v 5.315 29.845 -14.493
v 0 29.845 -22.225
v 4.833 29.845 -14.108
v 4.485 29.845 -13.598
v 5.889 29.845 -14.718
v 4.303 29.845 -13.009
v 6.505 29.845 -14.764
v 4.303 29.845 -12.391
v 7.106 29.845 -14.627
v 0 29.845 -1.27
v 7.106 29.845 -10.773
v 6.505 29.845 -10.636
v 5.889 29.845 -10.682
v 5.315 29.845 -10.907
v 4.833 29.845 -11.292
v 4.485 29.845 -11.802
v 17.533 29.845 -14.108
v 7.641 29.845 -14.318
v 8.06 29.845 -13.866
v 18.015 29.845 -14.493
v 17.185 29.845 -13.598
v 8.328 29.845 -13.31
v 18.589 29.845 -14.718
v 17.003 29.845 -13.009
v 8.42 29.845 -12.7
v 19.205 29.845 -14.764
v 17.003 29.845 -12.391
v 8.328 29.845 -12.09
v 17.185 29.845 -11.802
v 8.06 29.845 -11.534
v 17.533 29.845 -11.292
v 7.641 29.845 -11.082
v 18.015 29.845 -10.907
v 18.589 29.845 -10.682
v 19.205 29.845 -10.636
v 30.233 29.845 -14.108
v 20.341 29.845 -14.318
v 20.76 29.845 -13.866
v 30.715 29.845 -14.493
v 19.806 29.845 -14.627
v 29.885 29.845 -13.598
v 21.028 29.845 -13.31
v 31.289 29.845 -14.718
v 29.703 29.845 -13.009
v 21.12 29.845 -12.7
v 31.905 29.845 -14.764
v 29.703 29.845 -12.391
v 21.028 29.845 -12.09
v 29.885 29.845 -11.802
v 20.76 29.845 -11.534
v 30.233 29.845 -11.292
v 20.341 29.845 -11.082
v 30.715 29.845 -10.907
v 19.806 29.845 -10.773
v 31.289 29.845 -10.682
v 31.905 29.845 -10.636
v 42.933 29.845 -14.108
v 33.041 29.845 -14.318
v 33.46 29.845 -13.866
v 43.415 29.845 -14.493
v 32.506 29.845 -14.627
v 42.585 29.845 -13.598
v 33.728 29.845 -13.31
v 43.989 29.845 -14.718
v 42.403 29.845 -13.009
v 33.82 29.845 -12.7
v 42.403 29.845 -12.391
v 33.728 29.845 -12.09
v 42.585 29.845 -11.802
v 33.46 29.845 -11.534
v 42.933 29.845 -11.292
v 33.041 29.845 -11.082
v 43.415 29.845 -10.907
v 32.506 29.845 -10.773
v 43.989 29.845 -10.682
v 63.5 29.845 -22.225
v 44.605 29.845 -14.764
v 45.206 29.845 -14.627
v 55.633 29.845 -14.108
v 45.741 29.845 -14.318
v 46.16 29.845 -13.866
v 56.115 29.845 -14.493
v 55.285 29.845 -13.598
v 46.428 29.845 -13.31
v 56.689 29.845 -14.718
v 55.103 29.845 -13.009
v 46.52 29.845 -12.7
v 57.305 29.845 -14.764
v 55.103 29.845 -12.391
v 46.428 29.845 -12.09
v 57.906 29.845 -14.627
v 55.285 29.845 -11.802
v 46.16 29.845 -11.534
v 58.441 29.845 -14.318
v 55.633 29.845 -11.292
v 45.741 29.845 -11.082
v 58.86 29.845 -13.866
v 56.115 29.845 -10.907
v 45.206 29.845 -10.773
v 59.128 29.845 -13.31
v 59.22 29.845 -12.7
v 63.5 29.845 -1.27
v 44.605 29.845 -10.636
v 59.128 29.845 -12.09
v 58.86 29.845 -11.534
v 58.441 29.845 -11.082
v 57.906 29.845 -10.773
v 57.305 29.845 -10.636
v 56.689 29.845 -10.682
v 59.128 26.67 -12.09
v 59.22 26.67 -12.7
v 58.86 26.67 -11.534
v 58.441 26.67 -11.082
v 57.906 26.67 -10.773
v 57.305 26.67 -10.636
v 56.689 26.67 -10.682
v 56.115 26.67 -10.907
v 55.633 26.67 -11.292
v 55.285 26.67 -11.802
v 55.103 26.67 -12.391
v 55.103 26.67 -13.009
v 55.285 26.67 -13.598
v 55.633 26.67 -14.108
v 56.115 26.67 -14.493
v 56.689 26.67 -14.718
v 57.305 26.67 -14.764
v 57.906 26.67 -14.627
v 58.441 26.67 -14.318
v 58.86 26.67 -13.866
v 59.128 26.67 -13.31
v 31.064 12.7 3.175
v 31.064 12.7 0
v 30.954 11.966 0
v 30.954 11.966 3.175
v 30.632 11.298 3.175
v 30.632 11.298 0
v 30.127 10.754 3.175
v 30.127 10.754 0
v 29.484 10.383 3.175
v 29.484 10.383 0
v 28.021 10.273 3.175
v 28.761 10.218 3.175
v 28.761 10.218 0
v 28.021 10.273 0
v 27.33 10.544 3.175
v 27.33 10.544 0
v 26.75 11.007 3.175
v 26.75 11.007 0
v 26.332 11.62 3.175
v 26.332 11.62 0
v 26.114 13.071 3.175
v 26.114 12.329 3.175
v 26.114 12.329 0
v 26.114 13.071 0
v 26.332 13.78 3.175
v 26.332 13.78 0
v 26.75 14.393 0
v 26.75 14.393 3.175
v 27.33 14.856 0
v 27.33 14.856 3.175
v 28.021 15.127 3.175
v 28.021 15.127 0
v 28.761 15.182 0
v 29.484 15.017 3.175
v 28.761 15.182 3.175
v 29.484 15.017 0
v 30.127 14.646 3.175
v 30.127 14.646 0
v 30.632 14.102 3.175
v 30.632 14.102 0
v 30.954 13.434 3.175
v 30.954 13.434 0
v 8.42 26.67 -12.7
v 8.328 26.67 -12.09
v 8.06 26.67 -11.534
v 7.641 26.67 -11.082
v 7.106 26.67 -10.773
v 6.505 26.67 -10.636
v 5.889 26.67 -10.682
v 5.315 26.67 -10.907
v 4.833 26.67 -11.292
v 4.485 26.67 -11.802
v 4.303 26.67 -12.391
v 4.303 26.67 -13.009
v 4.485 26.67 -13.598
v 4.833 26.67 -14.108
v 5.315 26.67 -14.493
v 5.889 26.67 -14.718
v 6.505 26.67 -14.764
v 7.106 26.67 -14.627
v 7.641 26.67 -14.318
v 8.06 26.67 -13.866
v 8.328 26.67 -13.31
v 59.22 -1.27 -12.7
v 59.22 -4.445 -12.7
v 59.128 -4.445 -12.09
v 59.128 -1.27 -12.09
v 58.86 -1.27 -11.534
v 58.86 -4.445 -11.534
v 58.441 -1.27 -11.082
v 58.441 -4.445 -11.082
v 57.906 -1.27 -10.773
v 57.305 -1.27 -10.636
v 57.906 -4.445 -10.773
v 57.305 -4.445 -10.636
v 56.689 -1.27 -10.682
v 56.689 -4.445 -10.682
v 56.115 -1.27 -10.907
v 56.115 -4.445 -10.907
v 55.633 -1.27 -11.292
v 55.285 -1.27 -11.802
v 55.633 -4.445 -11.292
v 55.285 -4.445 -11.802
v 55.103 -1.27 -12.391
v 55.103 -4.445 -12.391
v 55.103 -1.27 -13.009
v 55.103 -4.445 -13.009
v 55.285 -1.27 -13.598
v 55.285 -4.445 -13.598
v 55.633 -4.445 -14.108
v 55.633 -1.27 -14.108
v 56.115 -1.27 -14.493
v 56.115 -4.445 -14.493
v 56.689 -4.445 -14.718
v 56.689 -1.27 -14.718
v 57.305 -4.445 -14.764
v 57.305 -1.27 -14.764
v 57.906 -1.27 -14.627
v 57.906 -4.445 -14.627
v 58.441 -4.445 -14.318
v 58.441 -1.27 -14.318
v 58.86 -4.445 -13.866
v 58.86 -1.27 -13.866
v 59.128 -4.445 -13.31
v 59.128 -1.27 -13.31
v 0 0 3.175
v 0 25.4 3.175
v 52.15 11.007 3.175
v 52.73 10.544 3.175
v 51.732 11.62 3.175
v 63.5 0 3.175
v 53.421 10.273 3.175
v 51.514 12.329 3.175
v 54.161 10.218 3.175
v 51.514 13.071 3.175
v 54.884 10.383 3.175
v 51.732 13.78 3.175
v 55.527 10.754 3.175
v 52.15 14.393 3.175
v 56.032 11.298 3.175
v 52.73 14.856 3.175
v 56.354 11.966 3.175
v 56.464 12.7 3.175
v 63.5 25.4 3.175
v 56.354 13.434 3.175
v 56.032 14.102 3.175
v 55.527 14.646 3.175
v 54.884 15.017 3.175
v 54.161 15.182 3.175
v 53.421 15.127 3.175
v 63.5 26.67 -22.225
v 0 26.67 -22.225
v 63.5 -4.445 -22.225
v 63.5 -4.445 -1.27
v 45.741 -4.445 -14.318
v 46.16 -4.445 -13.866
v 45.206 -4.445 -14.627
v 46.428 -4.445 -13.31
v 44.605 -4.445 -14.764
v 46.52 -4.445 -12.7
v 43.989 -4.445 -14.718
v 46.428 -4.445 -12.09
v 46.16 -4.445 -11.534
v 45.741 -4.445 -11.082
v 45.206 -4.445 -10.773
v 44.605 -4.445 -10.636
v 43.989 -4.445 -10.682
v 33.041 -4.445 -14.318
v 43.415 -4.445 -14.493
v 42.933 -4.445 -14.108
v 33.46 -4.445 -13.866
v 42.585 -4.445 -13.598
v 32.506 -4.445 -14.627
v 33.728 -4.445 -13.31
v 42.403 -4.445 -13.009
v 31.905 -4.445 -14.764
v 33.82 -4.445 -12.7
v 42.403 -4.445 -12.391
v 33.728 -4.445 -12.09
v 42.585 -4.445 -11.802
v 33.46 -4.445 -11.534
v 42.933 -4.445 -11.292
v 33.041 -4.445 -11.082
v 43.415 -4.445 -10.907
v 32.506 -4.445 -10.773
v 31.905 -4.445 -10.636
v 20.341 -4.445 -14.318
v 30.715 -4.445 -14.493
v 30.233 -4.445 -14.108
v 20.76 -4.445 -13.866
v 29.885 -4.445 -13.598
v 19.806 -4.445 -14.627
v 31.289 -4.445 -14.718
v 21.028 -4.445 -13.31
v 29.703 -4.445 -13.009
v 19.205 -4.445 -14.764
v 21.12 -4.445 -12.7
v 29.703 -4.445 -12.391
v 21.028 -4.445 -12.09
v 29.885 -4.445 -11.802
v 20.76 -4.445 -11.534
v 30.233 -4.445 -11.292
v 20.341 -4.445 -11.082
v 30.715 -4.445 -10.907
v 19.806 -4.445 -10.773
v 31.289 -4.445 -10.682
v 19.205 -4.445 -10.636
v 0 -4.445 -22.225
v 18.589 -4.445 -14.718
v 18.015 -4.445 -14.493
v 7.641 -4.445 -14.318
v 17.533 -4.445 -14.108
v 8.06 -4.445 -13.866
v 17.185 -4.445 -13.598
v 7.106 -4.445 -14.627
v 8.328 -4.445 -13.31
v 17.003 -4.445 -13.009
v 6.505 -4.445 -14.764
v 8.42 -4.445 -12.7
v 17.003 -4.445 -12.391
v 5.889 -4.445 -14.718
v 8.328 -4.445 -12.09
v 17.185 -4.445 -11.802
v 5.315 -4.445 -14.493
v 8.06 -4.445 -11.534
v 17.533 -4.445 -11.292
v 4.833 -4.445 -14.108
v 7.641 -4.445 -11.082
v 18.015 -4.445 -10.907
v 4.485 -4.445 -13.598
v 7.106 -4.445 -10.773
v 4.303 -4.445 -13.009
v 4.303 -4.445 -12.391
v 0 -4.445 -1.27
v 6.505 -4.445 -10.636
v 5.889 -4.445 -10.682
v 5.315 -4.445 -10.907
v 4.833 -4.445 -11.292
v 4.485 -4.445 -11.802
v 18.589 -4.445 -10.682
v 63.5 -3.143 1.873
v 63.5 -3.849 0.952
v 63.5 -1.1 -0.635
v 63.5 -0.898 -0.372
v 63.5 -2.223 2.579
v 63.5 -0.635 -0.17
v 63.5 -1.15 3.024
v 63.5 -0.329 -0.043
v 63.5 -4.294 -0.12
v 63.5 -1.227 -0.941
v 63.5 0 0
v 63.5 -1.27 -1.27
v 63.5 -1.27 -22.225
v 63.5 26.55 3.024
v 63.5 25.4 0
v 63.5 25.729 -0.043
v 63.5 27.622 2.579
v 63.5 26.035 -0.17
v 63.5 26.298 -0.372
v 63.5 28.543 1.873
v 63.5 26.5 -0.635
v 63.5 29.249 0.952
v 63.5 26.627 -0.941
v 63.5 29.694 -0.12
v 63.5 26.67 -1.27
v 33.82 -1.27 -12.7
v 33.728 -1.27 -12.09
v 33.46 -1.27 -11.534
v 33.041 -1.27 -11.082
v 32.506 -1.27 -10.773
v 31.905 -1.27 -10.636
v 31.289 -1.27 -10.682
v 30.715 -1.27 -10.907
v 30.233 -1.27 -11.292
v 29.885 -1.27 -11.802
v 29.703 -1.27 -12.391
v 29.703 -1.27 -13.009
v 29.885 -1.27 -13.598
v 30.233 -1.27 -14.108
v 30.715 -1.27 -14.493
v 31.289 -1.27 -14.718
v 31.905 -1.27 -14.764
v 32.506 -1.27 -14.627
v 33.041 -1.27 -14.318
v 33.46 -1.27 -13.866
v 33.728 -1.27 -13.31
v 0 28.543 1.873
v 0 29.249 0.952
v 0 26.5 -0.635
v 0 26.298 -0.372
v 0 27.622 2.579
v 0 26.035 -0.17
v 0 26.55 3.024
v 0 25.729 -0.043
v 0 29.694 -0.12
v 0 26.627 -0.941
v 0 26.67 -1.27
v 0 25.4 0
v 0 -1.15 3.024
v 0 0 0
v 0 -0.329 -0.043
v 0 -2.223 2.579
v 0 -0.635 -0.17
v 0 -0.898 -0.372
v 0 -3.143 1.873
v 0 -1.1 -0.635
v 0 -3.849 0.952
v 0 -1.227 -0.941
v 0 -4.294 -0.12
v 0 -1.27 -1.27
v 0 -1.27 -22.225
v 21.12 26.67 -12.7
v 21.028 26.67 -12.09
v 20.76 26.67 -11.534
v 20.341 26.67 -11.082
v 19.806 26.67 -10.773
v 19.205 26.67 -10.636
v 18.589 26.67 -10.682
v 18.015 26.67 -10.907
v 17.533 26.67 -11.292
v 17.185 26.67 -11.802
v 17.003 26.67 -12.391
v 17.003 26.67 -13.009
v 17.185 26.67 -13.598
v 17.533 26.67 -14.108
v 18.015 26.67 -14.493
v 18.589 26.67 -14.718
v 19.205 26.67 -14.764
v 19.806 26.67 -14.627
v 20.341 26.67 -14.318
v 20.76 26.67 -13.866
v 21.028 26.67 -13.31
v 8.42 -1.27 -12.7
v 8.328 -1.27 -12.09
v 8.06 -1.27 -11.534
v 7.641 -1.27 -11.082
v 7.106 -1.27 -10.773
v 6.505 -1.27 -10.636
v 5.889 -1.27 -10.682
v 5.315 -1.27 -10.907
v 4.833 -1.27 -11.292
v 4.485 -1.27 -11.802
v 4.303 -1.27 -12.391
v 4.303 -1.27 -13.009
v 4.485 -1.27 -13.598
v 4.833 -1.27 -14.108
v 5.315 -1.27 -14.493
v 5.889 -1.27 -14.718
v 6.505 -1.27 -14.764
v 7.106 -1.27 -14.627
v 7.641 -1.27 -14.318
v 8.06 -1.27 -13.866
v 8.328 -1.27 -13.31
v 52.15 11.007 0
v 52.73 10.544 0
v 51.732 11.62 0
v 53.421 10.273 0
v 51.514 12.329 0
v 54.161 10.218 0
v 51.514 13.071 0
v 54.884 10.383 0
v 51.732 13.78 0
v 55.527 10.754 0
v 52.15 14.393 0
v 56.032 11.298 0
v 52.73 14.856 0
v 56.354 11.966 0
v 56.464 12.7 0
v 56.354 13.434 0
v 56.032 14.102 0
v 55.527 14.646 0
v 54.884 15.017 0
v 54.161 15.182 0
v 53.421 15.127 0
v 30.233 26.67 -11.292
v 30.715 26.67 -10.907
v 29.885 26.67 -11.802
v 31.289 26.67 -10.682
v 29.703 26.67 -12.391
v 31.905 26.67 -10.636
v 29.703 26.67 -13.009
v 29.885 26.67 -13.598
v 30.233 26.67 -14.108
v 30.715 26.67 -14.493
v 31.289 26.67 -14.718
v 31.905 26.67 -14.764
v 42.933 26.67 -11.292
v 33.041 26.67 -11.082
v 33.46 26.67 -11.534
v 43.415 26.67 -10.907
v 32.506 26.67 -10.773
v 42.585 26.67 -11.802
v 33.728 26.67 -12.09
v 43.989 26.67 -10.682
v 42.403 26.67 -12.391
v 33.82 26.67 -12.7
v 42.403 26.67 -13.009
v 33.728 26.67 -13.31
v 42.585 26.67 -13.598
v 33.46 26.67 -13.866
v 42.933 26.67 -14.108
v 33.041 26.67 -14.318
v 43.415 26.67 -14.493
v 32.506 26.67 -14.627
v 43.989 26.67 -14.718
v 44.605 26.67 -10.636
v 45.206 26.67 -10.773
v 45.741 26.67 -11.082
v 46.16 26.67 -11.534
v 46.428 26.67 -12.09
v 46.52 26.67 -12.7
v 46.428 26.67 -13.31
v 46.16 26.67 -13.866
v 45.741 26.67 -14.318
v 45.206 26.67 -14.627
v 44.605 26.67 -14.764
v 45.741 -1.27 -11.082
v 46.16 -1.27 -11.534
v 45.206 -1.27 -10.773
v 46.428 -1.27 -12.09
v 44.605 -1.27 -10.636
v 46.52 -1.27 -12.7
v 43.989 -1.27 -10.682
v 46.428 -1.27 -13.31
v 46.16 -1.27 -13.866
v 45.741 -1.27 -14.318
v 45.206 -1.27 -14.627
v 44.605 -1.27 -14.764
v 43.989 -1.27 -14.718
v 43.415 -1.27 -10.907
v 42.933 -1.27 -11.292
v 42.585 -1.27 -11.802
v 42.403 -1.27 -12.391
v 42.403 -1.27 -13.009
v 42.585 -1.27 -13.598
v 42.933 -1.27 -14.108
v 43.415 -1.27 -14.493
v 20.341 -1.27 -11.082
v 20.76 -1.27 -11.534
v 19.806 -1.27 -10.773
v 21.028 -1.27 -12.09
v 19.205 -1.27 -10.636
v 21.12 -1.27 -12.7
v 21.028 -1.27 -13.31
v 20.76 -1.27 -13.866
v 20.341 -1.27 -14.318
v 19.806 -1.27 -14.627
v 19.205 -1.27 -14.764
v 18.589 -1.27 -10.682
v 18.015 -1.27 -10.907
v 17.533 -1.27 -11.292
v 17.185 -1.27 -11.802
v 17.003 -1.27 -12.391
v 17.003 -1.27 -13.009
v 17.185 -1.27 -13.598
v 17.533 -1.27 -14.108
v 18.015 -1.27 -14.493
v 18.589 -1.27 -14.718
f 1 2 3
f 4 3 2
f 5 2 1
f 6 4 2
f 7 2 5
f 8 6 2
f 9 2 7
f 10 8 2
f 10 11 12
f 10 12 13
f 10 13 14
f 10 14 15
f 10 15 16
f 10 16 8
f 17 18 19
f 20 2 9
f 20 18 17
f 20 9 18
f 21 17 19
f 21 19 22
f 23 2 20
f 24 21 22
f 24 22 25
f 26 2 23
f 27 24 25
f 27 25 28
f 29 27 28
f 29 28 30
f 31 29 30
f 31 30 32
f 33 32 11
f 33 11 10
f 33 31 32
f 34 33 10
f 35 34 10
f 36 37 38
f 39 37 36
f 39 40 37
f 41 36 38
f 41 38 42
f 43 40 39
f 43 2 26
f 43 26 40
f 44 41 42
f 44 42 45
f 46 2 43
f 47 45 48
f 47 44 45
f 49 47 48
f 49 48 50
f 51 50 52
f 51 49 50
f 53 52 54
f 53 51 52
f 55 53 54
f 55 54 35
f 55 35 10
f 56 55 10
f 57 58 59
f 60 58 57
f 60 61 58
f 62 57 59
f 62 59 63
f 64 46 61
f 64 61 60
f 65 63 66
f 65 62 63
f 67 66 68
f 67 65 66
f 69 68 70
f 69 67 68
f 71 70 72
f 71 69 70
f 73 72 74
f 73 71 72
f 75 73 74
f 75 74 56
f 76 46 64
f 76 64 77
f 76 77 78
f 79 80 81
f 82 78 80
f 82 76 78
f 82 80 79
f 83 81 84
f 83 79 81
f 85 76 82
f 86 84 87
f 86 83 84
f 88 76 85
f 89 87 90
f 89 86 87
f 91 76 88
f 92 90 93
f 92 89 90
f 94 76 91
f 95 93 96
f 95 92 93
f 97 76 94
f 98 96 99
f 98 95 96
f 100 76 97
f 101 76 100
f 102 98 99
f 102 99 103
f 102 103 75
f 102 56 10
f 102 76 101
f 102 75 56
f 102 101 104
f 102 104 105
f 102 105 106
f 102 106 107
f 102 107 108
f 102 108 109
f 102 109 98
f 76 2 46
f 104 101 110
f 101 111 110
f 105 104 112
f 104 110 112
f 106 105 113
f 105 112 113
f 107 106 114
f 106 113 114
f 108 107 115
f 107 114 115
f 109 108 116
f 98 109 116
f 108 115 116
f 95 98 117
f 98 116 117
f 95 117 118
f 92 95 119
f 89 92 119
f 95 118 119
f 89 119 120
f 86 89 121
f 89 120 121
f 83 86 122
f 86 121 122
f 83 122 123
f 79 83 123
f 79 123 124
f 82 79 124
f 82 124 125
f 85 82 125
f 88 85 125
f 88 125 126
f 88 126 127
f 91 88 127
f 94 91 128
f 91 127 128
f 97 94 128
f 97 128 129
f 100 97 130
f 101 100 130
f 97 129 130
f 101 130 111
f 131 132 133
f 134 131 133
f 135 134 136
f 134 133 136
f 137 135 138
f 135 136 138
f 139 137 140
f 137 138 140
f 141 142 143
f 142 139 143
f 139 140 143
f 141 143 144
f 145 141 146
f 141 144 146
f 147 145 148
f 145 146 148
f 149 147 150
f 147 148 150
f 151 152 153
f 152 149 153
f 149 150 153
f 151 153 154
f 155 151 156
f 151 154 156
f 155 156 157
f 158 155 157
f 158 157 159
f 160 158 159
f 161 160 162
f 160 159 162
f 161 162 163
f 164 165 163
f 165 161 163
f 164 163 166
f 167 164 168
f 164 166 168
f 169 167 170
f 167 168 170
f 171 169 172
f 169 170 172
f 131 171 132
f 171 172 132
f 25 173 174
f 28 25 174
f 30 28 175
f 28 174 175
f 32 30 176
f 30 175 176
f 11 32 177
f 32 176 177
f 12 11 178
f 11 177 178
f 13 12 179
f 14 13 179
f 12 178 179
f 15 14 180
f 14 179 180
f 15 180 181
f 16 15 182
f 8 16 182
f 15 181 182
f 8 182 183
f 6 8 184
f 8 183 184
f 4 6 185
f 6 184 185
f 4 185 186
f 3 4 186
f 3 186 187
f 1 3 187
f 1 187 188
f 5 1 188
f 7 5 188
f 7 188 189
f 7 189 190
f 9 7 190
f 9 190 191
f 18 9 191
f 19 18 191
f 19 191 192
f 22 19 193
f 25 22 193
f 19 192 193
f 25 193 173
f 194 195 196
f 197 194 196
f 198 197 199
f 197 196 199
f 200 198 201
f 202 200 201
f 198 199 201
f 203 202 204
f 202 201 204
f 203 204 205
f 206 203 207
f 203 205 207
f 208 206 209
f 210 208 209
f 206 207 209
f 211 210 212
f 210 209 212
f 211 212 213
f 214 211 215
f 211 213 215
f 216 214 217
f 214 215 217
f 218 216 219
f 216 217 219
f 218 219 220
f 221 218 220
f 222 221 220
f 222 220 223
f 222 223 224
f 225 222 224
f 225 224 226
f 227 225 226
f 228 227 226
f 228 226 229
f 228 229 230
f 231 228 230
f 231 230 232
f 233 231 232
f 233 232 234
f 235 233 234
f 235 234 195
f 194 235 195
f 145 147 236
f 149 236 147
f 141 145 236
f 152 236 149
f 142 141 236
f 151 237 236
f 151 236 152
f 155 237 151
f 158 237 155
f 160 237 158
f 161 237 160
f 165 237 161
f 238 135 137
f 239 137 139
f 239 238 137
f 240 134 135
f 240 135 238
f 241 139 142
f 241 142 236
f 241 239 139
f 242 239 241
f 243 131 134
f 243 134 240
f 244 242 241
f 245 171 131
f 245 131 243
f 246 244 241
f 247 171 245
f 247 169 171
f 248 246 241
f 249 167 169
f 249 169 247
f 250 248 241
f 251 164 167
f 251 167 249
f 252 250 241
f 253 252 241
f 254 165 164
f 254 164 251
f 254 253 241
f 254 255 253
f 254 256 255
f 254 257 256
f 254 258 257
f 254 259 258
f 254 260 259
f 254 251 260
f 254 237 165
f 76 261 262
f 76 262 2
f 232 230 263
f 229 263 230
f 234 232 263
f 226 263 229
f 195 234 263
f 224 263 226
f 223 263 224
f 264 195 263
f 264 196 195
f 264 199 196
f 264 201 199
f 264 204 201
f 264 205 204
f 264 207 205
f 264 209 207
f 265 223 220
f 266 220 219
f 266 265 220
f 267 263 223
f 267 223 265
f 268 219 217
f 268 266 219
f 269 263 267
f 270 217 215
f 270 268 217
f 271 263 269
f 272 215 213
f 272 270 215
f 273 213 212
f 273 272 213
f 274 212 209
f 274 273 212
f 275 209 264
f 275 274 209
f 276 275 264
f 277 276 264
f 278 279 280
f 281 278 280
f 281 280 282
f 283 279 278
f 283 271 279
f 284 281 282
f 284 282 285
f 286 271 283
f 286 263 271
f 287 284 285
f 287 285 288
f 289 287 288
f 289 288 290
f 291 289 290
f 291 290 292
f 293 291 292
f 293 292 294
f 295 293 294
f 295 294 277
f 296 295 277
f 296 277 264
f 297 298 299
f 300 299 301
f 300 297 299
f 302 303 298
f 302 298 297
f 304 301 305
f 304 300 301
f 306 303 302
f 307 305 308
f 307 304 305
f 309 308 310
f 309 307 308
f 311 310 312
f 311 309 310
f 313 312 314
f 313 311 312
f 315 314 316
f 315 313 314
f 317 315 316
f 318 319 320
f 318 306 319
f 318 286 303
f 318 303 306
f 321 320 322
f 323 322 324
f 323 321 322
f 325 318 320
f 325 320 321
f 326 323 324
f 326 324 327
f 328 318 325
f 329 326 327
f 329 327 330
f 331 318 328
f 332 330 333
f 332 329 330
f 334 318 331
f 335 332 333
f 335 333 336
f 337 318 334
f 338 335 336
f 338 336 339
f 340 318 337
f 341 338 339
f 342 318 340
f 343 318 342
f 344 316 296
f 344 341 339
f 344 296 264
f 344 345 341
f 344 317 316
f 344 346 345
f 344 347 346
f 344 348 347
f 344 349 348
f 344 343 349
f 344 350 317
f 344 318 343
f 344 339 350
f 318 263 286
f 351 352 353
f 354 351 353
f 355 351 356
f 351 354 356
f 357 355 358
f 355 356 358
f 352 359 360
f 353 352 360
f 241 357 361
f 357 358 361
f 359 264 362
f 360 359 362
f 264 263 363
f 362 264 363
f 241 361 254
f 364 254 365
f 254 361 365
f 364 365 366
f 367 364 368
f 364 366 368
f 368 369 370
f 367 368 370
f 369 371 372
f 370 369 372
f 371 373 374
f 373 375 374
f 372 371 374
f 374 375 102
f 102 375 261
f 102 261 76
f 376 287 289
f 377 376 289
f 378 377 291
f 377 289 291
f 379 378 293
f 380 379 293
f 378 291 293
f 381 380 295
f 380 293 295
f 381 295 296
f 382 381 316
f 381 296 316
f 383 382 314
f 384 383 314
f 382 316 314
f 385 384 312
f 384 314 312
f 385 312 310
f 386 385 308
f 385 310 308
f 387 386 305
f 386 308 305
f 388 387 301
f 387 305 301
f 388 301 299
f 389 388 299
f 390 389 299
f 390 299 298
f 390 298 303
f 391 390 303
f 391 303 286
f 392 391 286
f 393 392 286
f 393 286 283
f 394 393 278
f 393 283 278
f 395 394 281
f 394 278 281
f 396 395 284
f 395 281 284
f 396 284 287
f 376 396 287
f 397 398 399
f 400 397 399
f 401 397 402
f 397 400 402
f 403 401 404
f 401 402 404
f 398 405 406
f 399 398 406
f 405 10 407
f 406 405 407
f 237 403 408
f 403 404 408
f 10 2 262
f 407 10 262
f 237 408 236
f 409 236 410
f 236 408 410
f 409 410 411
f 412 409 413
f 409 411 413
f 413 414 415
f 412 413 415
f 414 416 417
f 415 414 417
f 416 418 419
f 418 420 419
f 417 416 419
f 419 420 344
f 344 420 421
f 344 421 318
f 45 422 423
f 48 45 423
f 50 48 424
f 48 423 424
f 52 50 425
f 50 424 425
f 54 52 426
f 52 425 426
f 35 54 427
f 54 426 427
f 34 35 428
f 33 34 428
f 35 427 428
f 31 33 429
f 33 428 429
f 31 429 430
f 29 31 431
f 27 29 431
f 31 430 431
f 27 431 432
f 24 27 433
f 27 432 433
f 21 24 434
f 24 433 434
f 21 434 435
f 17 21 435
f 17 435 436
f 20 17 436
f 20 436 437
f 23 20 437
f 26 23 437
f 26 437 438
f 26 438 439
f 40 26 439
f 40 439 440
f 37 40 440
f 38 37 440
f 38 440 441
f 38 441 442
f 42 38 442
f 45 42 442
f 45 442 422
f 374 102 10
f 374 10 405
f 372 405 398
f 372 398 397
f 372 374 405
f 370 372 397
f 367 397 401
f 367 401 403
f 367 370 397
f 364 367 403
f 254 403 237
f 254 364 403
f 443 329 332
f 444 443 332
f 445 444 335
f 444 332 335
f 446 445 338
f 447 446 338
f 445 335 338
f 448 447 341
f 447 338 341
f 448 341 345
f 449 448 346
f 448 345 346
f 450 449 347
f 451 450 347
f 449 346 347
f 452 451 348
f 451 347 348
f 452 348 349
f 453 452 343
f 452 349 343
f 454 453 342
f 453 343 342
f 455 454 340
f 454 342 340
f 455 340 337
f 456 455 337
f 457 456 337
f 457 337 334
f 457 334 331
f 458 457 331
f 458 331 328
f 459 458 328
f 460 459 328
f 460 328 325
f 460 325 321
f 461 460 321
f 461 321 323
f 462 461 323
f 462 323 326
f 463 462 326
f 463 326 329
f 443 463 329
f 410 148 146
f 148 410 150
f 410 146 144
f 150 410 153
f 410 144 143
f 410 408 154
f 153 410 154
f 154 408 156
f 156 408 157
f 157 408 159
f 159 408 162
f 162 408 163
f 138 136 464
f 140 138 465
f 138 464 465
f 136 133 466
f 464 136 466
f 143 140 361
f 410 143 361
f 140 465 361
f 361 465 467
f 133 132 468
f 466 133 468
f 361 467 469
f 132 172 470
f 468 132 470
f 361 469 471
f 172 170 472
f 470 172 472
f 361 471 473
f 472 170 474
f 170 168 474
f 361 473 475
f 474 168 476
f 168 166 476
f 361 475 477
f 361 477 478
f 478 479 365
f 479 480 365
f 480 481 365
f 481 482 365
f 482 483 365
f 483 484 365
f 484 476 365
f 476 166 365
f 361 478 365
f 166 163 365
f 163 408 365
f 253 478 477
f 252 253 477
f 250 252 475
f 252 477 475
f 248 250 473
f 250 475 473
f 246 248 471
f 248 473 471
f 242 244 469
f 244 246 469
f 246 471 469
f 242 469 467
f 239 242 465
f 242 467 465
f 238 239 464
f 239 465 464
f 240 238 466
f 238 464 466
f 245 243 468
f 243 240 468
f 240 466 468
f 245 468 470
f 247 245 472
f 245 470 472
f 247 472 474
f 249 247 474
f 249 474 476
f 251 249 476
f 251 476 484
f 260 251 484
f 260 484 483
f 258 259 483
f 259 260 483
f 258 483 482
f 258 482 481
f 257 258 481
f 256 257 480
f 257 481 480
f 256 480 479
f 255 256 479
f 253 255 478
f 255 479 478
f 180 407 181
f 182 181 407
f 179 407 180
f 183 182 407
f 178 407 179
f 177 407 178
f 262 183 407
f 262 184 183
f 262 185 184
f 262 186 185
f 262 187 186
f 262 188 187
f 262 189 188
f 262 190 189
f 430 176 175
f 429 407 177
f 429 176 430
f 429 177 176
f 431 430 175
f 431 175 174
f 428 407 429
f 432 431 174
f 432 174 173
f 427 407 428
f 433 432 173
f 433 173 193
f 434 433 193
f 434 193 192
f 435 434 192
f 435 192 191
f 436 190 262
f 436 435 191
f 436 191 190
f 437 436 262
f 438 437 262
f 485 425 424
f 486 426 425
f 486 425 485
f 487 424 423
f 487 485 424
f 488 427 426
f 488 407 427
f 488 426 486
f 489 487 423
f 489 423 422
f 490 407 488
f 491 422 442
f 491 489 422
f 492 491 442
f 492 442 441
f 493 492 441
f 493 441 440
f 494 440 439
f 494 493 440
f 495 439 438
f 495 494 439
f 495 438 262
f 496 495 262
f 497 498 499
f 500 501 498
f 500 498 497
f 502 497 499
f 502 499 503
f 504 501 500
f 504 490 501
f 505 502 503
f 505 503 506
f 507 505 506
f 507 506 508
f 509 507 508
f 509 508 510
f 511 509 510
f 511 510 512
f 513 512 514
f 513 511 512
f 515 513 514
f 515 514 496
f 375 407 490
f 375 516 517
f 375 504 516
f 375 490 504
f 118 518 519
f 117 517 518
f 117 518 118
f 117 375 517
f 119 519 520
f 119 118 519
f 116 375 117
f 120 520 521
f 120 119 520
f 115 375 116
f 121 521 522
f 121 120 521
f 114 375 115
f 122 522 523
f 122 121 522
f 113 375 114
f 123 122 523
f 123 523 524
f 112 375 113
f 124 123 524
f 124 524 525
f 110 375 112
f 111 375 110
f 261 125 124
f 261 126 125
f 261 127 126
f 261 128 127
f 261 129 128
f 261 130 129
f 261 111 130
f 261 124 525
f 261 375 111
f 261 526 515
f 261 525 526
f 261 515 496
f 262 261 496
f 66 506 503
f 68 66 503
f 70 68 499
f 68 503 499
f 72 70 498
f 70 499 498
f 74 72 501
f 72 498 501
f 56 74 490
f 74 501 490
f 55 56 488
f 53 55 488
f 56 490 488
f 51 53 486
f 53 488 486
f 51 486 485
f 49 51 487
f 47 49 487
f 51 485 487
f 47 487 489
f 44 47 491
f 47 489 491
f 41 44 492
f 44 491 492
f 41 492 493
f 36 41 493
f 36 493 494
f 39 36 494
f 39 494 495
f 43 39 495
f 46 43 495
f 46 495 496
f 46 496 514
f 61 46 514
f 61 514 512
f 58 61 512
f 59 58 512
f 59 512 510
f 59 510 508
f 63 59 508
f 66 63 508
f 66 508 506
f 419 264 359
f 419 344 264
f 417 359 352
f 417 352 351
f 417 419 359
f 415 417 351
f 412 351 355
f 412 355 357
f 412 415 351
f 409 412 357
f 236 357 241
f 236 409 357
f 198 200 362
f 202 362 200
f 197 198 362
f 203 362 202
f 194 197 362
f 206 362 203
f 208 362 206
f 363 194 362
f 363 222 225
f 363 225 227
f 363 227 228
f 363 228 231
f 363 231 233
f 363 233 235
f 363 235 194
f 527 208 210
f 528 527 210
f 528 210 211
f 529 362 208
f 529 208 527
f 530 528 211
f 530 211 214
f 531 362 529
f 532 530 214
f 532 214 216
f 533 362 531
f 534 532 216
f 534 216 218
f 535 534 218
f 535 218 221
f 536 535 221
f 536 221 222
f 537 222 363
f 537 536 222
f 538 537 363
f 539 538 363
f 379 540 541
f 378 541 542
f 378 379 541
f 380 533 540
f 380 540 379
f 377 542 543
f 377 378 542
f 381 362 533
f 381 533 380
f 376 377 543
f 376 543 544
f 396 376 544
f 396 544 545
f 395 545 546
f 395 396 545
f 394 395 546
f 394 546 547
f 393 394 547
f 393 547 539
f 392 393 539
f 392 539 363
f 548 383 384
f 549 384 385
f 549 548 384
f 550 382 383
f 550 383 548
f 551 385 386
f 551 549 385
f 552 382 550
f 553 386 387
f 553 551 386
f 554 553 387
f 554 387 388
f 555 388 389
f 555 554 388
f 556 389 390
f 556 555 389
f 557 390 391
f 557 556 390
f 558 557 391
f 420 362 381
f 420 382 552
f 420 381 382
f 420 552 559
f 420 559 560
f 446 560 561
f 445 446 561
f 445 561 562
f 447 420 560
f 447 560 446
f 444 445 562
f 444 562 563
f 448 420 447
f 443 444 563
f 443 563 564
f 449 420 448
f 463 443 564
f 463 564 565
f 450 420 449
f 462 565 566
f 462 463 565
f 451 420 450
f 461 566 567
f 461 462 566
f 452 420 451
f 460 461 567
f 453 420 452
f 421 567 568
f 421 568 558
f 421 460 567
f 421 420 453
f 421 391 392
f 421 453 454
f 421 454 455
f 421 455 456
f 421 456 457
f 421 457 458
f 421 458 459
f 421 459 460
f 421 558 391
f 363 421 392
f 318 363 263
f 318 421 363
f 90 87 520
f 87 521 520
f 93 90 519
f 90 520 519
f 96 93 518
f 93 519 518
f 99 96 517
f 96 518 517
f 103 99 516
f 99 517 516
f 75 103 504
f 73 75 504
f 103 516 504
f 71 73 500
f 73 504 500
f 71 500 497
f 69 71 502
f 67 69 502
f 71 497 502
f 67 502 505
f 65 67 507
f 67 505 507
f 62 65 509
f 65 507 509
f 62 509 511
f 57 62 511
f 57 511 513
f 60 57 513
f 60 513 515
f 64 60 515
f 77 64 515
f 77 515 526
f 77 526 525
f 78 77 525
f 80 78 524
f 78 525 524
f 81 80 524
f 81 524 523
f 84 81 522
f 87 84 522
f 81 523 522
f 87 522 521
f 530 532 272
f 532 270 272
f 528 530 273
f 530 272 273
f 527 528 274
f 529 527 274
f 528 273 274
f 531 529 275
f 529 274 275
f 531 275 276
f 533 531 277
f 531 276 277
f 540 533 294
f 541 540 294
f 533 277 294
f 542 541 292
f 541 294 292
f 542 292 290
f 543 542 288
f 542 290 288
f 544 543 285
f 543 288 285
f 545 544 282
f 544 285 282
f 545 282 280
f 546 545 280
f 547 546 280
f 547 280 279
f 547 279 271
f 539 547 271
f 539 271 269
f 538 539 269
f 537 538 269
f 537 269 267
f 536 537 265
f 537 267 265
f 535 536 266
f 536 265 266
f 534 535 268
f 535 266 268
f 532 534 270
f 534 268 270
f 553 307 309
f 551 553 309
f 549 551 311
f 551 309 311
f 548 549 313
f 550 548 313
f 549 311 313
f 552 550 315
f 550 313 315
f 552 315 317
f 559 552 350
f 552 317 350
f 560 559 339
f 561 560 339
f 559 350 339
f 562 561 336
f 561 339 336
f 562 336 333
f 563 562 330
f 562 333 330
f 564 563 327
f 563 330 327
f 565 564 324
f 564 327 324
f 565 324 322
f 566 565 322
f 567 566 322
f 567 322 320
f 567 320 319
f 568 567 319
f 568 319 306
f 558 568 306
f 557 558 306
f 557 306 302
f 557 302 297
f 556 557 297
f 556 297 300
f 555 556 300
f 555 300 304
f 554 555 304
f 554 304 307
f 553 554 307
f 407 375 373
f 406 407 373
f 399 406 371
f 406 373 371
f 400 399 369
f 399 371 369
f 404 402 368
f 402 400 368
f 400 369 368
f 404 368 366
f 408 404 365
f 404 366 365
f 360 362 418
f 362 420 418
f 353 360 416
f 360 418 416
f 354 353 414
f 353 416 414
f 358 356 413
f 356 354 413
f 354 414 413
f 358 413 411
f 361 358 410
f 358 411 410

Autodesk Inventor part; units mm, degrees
ref_plane "YZ Plane" through (0, 0, 0) normal (1, 0, 0) x (0, 1, 0)
ref_plane "XZ Plane" through (0, 0, 0) normal (0, 1, 0) x (-1, 0, 0)
ref_plane "XY Plane" through (0, 0, 0) normal (0, 0, 1) x (1, 0, 0)
sketch "Sketch1 outline for Plate1" plane through (0, 0, 0) normal (0, 0, 1) x (1, 0, 0)
  line L0 (0, 25.4) -> (0, 0)
  line L1 (63.5, 25.4) -> (0, 25.4)
  line L2 (0, 0) -> (63.5, 0)
  line L3 (63.5, 0) -> (63.5, 25.4)
  circle A0 centre (28.575, 12.7) radius 2.4892
  circle A1 centre (53.975, 12.7) radius 2.4892
extrude "Plate1" add sketch "Sketch1 outline for Plate1" along normal blind 3.175
sketch "Sketch2" plane through (63.5, 26.67, -1.27) normal (0, 1, 0) x (-1, 0, 0)
  line L0 (63.5, 0) -> (0, 0)
  line L1 (0, 0) -> (0, -20.955)
  line L2 (0, -20.955) -> (63.5, -20.955)
  line L3 (63.5, -20.955) -> (63.5, 0)
edge flange "Flange1" height 25.4 angle 90 thickness 3.175 bend radius 1.27 thickness toward (0, 1, 0) relief tear relief width 3.175 relief depth 1.5875 corner gap 3.175 corner form 0 edges at (31.75, 25.4, 0) (31.75, 0, 0) wall of the first edge with corners at (0, 26.67, -1.27) (63.5, 26.67, -1.27) (63.5, 26.67, -22.225) (0, 26.67, -22.225)
bend "Bend1"
corner "Corner1"
sketch "Sketch1" plane through (0, 0, 0) normal (0, 0, 1) x (1, 0, 0)
  line L0 (0, 0) -> (75.688628, 0)
  line L1 (75.688628, -63.5) -> (0, -63.5)
  line L2 (20.955, 0) -> (25.144314, 0)
  line L3 (25.144314, 0) -> (25.144314, -3.175)
  line L4 (25.144314, -3.175) -> (20.955, -3.175)
  line L5 (20.955, -3.175) -> (20.955, 0)
  line L6 (20.955, -63.5) -> (20.955, 0)
  line L7 (25.144314, -63.5) -> (25.144314, 0)
  line L8 (20.955, -63.5) -> (25.144314, -63.5)
  line L9 (25.144314, -63.5) -> (25.144314, -60.325)
  line L10 (25.144314, -60.325) -> (20.955, -60.325)
  line L11 (20.955, -60.325) -> (20.955, -63.5)
  line L12 (50.544314, -63.5) -> (54.733628, -63.5)
  line L13 (54.733628, -63.5) -> (54.733628, -60.325)
  line L14 (54.733628, -60.325) -> (50.544314, -60.325)
  line L15 (50.544314, -60.325) -> (50.544314, -63.5)
  line L16 (50.544314, 0) -> (50.544314, -63.5)
  line L17 (54.733628, 0) -> (54.733628, -63.5)
  line L18 (50.544314, 0) -> (54.733628, 0)
  line L19 (54.733628, 0) -> (54.733628, -3.175)
  line L20 (54.733628, -3.175) -> (50.544314, -3.175)
  line L21 (50.544314, -3.175) -> (50.544314, 0)
  dimension "d10" = 12.7
  dimension "d11" = 28.575
sketch "Sketch3" plane through (0, -4.445, -22.225) normal (0, -1, 0) x (1, 0, 0)
  line L0 (0, 0) -> (0, 20.955) projected
  line L1 (63.5, 0) -> (0, 0) projected
  circle A0 centre (6.35, 9.525) radius 2.0701
  circle A1 centre (19.05, 9.525) radius 2.0701
  circle A2 centre (31.75, 9.525) radius 2.0701
  circle A3 centre (44.45, 9.525) radius 2.0701
  circle A4 centre (57.15, 9.525) radius 2.0701
  point P0 (0, 22.225)
  dimension "d23" = 4.1402
  dimension "d24" = 12.7
  dimension "d25" = 6.35
  dimension "d28" = 12.7
extrude "Extrusion1" cut sketch "Sketch3" against normal blind 50.8
equation "\"d13\" = BendReliefWidth"
equation "\"d14\" = BendReliefDepth"
equation "\"d15\" = MinimumRemnant"
equation "\"d16\" = BendRadius"
equation "\"d20\" = CornerReliefSize"
equation "\"d21\" = GapSize"
equation "\"d22\" = JacobiRadiusSize"
equation "\"BendRadius\" = Thickness"
equation "\"BendReliefWidth\" = Thickness"
equation "\"BendReliefDepth\" = 0.5 * Thickness"
equation "\"CornerReliefSize\" = 4 * Thickness"
equation "\"MinimumRemnant\" = 2 * Thickness"
equation "\"TransitionRadius\" = BendRadius"
equation "\"JacobiRadiusSize\" = BendRadius"
equation "\"GapSize\" = Thickness"
equation "\"d12\" = BendRadius"
equation "\"Thickness\" = 3.175"
properties part number "Side Mount Custom" material "Aluminum 6061"
